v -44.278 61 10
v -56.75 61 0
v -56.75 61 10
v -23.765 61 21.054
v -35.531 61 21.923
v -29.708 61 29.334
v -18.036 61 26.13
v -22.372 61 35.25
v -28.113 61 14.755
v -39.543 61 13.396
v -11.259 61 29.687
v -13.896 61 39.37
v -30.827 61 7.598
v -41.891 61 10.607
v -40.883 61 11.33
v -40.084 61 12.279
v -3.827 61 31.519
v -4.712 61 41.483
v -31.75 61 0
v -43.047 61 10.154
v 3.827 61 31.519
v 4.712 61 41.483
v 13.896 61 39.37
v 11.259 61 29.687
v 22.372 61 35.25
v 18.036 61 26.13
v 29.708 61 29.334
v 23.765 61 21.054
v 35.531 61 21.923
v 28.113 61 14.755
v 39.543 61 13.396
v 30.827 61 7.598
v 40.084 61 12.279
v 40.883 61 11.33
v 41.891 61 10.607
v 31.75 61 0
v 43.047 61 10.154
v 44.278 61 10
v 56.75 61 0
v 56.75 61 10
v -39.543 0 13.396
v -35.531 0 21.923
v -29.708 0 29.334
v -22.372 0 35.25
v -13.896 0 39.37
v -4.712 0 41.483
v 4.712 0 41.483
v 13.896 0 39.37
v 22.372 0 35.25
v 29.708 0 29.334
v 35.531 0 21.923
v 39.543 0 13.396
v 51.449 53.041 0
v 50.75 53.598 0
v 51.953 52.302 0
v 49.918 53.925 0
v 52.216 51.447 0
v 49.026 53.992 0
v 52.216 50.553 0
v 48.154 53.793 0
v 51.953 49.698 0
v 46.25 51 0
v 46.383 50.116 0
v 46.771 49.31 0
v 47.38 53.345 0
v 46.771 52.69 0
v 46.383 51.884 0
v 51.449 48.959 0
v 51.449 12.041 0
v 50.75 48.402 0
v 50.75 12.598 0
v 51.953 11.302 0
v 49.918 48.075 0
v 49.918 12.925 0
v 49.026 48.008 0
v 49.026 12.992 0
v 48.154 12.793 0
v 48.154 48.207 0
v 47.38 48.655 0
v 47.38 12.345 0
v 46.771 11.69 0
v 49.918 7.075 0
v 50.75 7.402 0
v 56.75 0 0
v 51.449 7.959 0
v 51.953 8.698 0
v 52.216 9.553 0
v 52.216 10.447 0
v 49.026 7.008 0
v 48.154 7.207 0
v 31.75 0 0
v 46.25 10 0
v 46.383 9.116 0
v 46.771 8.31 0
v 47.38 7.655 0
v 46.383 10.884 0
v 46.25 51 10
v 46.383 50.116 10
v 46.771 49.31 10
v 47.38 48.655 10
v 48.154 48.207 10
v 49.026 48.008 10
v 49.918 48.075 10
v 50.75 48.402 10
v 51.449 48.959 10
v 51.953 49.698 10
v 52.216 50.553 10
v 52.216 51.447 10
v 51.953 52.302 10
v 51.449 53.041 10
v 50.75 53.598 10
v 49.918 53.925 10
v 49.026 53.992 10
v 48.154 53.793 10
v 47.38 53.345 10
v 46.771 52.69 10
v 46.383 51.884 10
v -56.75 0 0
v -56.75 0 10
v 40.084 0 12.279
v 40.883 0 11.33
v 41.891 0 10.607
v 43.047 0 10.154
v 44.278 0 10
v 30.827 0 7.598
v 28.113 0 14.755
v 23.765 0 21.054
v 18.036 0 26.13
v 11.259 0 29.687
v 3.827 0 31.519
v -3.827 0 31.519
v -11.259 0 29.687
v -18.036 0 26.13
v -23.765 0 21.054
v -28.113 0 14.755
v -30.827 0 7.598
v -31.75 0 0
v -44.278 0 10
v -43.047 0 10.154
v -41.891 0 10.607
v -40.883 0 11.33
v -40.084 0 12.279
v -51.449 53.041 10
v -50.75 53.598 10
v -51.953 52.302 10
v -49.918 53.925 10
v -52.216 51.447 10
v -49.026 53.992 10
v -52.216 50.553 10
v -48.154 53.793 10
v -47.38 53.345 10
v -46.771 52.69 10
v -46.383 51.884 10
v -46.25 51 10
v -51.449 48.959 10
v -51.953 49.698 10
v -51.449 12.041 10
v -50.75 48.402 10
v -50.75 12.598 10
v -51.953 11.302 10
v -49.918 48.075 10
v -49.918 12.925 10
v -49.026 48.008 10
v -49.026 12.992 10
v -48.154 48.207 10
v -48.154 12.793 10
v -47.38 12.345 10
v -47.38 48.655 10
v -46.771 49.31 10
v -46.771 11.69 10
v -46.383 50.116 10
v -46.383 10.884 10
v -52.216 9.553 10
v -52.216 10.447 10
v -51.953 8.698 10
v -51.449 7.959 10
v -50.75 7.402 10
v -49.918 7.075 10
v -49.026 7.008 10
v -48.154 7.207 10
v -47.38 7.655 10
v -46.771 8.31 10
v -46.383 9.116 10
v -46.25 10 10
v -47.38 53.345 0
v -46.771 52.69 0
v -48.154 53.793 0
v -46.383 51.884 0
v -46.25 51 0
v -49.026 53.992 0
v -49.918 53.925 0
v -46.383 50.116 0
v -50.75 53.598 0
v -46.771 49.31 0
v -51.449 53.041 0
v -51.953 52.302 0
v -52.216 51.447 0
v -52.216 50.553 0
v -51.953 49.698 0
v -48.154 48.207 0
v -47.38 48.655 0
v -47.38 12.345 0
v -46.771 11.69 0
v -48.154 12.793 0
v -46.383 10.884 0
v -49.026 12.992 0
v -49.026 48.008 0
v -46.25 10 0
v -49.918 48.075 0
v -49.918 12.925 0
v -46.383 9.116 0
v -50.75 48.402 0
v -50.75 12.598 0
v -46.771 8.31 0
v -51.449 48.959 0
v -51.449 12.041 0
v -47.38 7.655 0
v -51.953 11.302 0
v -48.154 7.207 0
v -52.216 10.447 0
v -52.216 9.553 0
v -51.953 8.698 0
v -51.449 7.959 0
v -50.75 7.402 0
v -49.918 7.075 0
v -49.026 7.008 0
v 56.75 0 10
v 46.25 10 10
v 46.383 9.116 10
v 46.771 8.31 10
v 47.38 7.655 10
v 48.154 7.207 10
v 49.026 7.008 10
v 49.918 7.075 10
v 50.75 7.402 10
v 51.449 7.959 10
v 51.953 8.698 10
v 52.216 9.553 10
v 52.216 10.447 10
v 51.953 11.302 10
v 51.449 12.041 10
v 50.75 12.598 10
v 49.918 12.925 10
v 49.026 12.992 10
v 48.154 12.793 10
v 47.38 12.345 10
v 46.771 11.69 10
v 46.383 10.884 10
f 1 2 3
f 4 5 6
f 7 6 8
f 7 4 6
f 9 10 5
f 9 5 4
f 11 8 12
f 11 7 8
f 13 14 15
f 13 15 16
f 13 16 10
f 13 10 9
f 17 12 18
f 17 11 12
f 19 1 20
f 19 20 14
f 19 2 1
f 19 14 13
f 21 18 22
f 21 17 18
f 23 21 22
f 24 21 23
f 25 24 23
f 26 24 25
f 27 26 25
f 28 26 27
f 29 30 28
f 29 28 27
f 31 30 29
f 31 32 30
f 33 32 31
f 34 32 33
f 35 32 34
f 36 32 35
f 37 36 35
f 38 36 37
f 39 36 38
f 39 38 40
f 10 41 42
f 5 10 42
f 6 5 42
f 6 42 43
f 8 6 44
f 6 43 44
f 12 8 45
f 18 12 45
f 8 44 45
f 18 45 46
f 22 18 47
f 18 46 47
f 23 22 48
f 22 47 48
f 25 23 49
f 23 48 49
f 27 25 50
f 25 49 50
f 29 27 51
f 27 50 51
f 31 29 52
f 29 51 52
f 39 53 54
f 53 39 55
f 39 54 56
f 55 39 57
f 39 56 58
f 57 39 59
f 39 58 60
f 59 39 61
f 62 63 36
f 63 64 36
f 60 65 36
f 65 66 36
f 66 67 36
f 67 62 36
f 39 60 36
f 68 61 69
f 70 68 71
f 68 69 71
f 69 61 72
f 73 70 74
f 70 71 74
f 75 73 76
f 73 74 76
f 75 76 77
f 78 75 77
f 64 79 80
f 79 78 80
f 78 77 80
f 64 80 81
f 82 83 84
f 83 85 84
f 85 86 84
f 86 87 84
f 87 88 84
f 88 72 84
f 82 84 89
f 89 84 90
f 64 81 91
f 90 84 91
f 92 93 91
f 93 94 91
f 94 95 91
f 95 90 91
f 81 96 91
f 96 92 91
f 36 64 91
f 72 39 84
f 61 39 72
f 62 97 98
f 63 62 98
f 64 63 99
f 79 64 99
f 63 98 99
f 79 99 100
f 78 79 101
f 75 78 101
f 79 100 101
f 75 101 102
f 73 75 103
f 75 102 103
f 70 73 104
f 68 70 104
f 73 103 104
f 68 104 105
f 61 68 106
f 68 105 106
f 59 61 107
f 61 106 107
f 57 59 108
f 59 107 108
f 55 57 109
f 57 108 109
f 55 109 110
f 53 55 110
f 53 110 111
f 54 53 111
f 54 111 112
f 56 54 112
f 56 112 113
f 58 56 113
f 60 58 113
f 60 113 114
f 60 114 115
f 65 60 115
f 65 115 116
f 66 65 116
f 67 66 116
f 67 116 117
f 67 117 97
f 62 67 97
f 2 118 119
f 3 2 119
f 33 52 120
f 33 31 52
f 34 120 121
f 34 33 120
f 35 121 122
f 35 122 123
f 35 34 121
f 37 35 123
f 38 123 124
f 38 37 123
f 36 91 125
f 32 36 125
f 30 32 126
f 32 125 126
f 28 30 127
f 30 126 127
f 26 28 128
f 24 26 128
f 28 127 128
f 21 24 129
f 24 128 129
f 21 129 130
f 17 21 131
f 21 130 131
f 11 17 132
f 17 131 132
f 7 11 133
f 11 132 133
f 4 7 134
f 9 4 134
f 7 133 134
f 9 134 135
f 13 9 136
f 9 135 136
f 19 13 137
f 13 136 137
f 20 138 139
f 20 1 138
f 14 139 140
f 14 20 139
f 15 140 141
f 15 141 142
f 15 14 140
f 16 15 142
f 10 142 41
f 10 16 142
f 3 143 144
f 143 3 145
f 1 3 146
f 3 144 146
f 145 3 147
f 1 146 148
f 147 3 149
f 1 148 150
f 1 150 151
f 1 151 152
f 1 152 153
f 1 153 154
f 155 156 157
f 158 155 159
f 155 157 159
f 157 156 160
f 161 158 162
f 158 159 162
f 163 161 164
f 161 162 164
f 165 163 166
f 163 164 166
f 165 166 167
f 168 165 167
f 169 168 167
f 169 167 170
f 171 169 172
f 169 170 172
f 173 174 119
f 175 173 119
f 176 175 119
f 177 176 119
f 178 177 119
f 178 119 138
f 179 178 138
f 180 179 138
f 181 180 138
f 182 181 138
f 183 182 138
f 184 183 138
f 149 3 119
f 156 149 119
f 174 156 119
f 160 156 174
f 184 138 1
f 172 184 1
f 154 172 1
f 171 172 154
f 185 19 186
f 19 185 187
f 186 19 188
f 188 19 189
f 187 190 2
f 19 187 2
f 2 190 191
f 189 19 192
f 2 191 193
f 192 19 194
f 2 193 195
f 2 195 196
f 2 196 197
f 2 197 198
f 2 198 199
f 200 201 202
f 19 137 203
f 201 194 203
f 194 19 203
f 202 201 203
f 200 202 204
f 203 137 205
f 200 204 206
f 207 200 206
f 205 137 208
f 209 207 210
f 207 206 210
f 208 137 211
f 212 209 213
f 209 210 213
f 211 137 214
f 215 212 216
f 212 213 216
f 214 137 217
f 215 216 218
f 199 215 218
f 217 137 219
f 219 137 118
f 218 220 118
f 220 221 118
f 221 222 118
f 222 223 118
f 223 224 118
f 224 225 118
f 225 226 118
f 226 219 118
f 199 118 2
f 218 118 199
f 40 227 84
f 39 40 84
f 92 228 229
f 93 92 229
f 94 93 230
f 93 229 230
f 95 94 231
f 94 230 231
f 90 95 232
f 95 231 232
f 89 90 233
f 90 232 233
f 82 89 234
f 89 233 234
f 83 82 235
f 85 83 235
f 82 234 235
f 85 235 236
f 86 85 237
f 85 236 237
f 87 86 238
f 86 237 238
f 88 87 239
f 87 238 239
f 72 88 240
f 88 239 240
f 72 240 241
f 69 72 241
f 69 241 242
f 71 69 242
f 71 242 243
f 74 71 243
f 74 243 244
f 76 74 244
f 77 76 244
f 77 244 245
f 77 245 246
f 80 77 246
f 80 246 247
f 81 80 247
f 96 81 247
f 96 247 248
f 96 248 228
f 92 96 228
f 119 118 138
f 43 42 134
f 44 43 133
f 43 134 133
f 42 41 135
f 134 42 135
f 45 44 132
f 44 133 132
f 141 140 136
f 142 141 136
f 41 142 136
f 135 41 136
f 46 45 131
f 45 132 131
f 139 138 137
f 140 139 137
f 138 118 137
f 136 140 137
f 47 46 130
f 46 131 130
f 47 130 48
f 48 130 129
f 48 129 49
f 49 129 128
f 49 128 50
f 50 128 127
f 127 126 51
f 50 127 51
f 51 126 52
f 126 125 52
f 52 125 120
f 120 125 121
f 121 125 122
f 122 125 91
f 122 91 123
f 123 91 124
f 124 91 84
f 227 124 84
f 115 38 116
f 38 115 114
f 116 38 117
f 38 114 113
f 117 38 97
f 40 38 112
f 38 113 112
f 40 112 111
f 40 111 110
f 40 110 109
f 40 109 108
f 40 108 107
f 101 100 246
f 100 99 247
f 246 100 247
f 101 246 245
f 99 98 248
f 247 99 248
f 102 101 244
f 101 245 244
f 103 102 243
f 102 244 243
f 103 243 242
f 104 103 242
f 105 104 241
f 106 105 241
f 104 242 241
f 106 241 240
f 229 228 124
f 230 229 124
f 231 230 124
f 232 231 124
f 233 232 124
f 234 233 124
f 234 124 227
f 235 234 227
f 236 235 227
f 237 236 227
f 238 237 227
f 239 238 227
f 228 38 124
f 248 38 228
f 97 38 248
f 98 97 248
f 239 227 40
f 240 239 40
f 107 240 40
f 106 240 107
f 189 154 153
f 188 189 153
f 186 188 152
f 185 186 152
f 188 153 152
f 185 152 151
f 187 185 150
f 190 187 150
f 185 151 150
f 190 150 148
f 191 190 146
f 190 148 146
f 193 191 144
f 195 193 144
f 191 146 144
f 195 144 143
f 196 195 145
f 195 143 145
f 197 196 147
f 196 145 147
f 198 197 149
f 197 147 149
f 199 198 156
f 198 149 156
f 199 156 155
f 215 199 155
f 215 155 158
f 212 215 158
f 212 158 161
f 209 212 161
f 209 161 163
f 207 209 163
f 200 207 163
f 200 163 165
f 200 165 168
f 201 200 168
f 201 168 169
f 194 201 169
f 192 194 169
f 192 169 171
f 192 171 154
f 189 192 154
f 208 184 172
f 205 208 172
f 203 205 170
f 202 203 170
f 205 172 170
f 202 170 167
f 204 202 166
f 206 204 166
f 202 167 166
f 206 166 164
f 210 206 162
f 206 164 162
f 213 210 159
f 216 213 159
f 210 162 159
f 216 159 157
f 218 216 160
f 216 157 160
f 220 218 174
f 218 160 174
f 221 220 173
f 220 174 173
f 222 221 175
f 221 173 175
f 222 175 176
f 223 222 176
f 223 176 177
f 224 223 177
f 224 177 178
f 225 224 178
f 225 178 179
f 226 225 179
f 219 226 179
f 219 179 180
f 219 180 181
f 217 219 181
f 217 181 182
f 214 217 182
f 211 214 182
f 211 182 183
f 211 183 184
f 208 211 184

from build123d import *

# Parameters (mm, degrees)
BOSS_EXTRUDE1_DEPTH = 61
SKETCH2_R           = 3
CUT_EXTRUDE1_DEPTH  = 90.16066958
FILLET1_R           = 5


with BuildPart() as part:
    # Sketch1 → Boss-Extrude1 (new body)
    with BuildSketch(Plane(origin=(0, 0, 0), x_dir=(1, 0, 0), z_dir=(0, 1, 0))):
        with BuildLine():
            Line((-31.75, 0), (-41.75, 0))
            Line((-41.75, 0), (-56.75, 0))
            Line((-56.75, 0), (-56.75, -10))
            Line((-56.75, -10), (-40.534707351, -10))
            ThreePointArc((-40.534707351, -10), (0, -41.75), (40.534707351, -10))
            Line((40.534707351, -10), (56.75, -10))
            Line((56.75, -10), (56.75, 0))
            Line((56.75, 0), (41.75, 0))
            Line((41.75, 0), (31.75, 0))
            ThreePointArc((31.75, 0), (0, -31.75), (-31.75, 0))
        make_face()
    extrude(amount=BOSS_EXTRUDE1_DEPTH)

    # Sketch2 → Cut-Extrude1 (cut, through all)
    with BuildSketch(Plane.XY.offset(10)):
        with Locations((-49.25, 51)):
            Circle(SKETCH2_R)
        with Locations((-49.25, 10)):
            Circle(SKETCH2_R)
        with Locations(Location((49.25, 10, 0), (0, 0, 180))):
            Circle(SKETCH2_R)
        with Locations(Location((49.25, 51, 0), (0, 0, 180))):
            Circle(SKETCH2_R)
    extrude(amount=-CUT_EXTRUDE1_DEPTH, mode=Mode.SUBTRACT)

    # Fillet1
    fillet1_edges = [part.edges().sort_by_distance(p)[0] for p in [
        (40.534707351, 30.5, 10),
        (-40.534707351, 30.5, 10),
    ]]
    fillet(fillet1_edges, radius=FILLET1_R)


solid = part.part
